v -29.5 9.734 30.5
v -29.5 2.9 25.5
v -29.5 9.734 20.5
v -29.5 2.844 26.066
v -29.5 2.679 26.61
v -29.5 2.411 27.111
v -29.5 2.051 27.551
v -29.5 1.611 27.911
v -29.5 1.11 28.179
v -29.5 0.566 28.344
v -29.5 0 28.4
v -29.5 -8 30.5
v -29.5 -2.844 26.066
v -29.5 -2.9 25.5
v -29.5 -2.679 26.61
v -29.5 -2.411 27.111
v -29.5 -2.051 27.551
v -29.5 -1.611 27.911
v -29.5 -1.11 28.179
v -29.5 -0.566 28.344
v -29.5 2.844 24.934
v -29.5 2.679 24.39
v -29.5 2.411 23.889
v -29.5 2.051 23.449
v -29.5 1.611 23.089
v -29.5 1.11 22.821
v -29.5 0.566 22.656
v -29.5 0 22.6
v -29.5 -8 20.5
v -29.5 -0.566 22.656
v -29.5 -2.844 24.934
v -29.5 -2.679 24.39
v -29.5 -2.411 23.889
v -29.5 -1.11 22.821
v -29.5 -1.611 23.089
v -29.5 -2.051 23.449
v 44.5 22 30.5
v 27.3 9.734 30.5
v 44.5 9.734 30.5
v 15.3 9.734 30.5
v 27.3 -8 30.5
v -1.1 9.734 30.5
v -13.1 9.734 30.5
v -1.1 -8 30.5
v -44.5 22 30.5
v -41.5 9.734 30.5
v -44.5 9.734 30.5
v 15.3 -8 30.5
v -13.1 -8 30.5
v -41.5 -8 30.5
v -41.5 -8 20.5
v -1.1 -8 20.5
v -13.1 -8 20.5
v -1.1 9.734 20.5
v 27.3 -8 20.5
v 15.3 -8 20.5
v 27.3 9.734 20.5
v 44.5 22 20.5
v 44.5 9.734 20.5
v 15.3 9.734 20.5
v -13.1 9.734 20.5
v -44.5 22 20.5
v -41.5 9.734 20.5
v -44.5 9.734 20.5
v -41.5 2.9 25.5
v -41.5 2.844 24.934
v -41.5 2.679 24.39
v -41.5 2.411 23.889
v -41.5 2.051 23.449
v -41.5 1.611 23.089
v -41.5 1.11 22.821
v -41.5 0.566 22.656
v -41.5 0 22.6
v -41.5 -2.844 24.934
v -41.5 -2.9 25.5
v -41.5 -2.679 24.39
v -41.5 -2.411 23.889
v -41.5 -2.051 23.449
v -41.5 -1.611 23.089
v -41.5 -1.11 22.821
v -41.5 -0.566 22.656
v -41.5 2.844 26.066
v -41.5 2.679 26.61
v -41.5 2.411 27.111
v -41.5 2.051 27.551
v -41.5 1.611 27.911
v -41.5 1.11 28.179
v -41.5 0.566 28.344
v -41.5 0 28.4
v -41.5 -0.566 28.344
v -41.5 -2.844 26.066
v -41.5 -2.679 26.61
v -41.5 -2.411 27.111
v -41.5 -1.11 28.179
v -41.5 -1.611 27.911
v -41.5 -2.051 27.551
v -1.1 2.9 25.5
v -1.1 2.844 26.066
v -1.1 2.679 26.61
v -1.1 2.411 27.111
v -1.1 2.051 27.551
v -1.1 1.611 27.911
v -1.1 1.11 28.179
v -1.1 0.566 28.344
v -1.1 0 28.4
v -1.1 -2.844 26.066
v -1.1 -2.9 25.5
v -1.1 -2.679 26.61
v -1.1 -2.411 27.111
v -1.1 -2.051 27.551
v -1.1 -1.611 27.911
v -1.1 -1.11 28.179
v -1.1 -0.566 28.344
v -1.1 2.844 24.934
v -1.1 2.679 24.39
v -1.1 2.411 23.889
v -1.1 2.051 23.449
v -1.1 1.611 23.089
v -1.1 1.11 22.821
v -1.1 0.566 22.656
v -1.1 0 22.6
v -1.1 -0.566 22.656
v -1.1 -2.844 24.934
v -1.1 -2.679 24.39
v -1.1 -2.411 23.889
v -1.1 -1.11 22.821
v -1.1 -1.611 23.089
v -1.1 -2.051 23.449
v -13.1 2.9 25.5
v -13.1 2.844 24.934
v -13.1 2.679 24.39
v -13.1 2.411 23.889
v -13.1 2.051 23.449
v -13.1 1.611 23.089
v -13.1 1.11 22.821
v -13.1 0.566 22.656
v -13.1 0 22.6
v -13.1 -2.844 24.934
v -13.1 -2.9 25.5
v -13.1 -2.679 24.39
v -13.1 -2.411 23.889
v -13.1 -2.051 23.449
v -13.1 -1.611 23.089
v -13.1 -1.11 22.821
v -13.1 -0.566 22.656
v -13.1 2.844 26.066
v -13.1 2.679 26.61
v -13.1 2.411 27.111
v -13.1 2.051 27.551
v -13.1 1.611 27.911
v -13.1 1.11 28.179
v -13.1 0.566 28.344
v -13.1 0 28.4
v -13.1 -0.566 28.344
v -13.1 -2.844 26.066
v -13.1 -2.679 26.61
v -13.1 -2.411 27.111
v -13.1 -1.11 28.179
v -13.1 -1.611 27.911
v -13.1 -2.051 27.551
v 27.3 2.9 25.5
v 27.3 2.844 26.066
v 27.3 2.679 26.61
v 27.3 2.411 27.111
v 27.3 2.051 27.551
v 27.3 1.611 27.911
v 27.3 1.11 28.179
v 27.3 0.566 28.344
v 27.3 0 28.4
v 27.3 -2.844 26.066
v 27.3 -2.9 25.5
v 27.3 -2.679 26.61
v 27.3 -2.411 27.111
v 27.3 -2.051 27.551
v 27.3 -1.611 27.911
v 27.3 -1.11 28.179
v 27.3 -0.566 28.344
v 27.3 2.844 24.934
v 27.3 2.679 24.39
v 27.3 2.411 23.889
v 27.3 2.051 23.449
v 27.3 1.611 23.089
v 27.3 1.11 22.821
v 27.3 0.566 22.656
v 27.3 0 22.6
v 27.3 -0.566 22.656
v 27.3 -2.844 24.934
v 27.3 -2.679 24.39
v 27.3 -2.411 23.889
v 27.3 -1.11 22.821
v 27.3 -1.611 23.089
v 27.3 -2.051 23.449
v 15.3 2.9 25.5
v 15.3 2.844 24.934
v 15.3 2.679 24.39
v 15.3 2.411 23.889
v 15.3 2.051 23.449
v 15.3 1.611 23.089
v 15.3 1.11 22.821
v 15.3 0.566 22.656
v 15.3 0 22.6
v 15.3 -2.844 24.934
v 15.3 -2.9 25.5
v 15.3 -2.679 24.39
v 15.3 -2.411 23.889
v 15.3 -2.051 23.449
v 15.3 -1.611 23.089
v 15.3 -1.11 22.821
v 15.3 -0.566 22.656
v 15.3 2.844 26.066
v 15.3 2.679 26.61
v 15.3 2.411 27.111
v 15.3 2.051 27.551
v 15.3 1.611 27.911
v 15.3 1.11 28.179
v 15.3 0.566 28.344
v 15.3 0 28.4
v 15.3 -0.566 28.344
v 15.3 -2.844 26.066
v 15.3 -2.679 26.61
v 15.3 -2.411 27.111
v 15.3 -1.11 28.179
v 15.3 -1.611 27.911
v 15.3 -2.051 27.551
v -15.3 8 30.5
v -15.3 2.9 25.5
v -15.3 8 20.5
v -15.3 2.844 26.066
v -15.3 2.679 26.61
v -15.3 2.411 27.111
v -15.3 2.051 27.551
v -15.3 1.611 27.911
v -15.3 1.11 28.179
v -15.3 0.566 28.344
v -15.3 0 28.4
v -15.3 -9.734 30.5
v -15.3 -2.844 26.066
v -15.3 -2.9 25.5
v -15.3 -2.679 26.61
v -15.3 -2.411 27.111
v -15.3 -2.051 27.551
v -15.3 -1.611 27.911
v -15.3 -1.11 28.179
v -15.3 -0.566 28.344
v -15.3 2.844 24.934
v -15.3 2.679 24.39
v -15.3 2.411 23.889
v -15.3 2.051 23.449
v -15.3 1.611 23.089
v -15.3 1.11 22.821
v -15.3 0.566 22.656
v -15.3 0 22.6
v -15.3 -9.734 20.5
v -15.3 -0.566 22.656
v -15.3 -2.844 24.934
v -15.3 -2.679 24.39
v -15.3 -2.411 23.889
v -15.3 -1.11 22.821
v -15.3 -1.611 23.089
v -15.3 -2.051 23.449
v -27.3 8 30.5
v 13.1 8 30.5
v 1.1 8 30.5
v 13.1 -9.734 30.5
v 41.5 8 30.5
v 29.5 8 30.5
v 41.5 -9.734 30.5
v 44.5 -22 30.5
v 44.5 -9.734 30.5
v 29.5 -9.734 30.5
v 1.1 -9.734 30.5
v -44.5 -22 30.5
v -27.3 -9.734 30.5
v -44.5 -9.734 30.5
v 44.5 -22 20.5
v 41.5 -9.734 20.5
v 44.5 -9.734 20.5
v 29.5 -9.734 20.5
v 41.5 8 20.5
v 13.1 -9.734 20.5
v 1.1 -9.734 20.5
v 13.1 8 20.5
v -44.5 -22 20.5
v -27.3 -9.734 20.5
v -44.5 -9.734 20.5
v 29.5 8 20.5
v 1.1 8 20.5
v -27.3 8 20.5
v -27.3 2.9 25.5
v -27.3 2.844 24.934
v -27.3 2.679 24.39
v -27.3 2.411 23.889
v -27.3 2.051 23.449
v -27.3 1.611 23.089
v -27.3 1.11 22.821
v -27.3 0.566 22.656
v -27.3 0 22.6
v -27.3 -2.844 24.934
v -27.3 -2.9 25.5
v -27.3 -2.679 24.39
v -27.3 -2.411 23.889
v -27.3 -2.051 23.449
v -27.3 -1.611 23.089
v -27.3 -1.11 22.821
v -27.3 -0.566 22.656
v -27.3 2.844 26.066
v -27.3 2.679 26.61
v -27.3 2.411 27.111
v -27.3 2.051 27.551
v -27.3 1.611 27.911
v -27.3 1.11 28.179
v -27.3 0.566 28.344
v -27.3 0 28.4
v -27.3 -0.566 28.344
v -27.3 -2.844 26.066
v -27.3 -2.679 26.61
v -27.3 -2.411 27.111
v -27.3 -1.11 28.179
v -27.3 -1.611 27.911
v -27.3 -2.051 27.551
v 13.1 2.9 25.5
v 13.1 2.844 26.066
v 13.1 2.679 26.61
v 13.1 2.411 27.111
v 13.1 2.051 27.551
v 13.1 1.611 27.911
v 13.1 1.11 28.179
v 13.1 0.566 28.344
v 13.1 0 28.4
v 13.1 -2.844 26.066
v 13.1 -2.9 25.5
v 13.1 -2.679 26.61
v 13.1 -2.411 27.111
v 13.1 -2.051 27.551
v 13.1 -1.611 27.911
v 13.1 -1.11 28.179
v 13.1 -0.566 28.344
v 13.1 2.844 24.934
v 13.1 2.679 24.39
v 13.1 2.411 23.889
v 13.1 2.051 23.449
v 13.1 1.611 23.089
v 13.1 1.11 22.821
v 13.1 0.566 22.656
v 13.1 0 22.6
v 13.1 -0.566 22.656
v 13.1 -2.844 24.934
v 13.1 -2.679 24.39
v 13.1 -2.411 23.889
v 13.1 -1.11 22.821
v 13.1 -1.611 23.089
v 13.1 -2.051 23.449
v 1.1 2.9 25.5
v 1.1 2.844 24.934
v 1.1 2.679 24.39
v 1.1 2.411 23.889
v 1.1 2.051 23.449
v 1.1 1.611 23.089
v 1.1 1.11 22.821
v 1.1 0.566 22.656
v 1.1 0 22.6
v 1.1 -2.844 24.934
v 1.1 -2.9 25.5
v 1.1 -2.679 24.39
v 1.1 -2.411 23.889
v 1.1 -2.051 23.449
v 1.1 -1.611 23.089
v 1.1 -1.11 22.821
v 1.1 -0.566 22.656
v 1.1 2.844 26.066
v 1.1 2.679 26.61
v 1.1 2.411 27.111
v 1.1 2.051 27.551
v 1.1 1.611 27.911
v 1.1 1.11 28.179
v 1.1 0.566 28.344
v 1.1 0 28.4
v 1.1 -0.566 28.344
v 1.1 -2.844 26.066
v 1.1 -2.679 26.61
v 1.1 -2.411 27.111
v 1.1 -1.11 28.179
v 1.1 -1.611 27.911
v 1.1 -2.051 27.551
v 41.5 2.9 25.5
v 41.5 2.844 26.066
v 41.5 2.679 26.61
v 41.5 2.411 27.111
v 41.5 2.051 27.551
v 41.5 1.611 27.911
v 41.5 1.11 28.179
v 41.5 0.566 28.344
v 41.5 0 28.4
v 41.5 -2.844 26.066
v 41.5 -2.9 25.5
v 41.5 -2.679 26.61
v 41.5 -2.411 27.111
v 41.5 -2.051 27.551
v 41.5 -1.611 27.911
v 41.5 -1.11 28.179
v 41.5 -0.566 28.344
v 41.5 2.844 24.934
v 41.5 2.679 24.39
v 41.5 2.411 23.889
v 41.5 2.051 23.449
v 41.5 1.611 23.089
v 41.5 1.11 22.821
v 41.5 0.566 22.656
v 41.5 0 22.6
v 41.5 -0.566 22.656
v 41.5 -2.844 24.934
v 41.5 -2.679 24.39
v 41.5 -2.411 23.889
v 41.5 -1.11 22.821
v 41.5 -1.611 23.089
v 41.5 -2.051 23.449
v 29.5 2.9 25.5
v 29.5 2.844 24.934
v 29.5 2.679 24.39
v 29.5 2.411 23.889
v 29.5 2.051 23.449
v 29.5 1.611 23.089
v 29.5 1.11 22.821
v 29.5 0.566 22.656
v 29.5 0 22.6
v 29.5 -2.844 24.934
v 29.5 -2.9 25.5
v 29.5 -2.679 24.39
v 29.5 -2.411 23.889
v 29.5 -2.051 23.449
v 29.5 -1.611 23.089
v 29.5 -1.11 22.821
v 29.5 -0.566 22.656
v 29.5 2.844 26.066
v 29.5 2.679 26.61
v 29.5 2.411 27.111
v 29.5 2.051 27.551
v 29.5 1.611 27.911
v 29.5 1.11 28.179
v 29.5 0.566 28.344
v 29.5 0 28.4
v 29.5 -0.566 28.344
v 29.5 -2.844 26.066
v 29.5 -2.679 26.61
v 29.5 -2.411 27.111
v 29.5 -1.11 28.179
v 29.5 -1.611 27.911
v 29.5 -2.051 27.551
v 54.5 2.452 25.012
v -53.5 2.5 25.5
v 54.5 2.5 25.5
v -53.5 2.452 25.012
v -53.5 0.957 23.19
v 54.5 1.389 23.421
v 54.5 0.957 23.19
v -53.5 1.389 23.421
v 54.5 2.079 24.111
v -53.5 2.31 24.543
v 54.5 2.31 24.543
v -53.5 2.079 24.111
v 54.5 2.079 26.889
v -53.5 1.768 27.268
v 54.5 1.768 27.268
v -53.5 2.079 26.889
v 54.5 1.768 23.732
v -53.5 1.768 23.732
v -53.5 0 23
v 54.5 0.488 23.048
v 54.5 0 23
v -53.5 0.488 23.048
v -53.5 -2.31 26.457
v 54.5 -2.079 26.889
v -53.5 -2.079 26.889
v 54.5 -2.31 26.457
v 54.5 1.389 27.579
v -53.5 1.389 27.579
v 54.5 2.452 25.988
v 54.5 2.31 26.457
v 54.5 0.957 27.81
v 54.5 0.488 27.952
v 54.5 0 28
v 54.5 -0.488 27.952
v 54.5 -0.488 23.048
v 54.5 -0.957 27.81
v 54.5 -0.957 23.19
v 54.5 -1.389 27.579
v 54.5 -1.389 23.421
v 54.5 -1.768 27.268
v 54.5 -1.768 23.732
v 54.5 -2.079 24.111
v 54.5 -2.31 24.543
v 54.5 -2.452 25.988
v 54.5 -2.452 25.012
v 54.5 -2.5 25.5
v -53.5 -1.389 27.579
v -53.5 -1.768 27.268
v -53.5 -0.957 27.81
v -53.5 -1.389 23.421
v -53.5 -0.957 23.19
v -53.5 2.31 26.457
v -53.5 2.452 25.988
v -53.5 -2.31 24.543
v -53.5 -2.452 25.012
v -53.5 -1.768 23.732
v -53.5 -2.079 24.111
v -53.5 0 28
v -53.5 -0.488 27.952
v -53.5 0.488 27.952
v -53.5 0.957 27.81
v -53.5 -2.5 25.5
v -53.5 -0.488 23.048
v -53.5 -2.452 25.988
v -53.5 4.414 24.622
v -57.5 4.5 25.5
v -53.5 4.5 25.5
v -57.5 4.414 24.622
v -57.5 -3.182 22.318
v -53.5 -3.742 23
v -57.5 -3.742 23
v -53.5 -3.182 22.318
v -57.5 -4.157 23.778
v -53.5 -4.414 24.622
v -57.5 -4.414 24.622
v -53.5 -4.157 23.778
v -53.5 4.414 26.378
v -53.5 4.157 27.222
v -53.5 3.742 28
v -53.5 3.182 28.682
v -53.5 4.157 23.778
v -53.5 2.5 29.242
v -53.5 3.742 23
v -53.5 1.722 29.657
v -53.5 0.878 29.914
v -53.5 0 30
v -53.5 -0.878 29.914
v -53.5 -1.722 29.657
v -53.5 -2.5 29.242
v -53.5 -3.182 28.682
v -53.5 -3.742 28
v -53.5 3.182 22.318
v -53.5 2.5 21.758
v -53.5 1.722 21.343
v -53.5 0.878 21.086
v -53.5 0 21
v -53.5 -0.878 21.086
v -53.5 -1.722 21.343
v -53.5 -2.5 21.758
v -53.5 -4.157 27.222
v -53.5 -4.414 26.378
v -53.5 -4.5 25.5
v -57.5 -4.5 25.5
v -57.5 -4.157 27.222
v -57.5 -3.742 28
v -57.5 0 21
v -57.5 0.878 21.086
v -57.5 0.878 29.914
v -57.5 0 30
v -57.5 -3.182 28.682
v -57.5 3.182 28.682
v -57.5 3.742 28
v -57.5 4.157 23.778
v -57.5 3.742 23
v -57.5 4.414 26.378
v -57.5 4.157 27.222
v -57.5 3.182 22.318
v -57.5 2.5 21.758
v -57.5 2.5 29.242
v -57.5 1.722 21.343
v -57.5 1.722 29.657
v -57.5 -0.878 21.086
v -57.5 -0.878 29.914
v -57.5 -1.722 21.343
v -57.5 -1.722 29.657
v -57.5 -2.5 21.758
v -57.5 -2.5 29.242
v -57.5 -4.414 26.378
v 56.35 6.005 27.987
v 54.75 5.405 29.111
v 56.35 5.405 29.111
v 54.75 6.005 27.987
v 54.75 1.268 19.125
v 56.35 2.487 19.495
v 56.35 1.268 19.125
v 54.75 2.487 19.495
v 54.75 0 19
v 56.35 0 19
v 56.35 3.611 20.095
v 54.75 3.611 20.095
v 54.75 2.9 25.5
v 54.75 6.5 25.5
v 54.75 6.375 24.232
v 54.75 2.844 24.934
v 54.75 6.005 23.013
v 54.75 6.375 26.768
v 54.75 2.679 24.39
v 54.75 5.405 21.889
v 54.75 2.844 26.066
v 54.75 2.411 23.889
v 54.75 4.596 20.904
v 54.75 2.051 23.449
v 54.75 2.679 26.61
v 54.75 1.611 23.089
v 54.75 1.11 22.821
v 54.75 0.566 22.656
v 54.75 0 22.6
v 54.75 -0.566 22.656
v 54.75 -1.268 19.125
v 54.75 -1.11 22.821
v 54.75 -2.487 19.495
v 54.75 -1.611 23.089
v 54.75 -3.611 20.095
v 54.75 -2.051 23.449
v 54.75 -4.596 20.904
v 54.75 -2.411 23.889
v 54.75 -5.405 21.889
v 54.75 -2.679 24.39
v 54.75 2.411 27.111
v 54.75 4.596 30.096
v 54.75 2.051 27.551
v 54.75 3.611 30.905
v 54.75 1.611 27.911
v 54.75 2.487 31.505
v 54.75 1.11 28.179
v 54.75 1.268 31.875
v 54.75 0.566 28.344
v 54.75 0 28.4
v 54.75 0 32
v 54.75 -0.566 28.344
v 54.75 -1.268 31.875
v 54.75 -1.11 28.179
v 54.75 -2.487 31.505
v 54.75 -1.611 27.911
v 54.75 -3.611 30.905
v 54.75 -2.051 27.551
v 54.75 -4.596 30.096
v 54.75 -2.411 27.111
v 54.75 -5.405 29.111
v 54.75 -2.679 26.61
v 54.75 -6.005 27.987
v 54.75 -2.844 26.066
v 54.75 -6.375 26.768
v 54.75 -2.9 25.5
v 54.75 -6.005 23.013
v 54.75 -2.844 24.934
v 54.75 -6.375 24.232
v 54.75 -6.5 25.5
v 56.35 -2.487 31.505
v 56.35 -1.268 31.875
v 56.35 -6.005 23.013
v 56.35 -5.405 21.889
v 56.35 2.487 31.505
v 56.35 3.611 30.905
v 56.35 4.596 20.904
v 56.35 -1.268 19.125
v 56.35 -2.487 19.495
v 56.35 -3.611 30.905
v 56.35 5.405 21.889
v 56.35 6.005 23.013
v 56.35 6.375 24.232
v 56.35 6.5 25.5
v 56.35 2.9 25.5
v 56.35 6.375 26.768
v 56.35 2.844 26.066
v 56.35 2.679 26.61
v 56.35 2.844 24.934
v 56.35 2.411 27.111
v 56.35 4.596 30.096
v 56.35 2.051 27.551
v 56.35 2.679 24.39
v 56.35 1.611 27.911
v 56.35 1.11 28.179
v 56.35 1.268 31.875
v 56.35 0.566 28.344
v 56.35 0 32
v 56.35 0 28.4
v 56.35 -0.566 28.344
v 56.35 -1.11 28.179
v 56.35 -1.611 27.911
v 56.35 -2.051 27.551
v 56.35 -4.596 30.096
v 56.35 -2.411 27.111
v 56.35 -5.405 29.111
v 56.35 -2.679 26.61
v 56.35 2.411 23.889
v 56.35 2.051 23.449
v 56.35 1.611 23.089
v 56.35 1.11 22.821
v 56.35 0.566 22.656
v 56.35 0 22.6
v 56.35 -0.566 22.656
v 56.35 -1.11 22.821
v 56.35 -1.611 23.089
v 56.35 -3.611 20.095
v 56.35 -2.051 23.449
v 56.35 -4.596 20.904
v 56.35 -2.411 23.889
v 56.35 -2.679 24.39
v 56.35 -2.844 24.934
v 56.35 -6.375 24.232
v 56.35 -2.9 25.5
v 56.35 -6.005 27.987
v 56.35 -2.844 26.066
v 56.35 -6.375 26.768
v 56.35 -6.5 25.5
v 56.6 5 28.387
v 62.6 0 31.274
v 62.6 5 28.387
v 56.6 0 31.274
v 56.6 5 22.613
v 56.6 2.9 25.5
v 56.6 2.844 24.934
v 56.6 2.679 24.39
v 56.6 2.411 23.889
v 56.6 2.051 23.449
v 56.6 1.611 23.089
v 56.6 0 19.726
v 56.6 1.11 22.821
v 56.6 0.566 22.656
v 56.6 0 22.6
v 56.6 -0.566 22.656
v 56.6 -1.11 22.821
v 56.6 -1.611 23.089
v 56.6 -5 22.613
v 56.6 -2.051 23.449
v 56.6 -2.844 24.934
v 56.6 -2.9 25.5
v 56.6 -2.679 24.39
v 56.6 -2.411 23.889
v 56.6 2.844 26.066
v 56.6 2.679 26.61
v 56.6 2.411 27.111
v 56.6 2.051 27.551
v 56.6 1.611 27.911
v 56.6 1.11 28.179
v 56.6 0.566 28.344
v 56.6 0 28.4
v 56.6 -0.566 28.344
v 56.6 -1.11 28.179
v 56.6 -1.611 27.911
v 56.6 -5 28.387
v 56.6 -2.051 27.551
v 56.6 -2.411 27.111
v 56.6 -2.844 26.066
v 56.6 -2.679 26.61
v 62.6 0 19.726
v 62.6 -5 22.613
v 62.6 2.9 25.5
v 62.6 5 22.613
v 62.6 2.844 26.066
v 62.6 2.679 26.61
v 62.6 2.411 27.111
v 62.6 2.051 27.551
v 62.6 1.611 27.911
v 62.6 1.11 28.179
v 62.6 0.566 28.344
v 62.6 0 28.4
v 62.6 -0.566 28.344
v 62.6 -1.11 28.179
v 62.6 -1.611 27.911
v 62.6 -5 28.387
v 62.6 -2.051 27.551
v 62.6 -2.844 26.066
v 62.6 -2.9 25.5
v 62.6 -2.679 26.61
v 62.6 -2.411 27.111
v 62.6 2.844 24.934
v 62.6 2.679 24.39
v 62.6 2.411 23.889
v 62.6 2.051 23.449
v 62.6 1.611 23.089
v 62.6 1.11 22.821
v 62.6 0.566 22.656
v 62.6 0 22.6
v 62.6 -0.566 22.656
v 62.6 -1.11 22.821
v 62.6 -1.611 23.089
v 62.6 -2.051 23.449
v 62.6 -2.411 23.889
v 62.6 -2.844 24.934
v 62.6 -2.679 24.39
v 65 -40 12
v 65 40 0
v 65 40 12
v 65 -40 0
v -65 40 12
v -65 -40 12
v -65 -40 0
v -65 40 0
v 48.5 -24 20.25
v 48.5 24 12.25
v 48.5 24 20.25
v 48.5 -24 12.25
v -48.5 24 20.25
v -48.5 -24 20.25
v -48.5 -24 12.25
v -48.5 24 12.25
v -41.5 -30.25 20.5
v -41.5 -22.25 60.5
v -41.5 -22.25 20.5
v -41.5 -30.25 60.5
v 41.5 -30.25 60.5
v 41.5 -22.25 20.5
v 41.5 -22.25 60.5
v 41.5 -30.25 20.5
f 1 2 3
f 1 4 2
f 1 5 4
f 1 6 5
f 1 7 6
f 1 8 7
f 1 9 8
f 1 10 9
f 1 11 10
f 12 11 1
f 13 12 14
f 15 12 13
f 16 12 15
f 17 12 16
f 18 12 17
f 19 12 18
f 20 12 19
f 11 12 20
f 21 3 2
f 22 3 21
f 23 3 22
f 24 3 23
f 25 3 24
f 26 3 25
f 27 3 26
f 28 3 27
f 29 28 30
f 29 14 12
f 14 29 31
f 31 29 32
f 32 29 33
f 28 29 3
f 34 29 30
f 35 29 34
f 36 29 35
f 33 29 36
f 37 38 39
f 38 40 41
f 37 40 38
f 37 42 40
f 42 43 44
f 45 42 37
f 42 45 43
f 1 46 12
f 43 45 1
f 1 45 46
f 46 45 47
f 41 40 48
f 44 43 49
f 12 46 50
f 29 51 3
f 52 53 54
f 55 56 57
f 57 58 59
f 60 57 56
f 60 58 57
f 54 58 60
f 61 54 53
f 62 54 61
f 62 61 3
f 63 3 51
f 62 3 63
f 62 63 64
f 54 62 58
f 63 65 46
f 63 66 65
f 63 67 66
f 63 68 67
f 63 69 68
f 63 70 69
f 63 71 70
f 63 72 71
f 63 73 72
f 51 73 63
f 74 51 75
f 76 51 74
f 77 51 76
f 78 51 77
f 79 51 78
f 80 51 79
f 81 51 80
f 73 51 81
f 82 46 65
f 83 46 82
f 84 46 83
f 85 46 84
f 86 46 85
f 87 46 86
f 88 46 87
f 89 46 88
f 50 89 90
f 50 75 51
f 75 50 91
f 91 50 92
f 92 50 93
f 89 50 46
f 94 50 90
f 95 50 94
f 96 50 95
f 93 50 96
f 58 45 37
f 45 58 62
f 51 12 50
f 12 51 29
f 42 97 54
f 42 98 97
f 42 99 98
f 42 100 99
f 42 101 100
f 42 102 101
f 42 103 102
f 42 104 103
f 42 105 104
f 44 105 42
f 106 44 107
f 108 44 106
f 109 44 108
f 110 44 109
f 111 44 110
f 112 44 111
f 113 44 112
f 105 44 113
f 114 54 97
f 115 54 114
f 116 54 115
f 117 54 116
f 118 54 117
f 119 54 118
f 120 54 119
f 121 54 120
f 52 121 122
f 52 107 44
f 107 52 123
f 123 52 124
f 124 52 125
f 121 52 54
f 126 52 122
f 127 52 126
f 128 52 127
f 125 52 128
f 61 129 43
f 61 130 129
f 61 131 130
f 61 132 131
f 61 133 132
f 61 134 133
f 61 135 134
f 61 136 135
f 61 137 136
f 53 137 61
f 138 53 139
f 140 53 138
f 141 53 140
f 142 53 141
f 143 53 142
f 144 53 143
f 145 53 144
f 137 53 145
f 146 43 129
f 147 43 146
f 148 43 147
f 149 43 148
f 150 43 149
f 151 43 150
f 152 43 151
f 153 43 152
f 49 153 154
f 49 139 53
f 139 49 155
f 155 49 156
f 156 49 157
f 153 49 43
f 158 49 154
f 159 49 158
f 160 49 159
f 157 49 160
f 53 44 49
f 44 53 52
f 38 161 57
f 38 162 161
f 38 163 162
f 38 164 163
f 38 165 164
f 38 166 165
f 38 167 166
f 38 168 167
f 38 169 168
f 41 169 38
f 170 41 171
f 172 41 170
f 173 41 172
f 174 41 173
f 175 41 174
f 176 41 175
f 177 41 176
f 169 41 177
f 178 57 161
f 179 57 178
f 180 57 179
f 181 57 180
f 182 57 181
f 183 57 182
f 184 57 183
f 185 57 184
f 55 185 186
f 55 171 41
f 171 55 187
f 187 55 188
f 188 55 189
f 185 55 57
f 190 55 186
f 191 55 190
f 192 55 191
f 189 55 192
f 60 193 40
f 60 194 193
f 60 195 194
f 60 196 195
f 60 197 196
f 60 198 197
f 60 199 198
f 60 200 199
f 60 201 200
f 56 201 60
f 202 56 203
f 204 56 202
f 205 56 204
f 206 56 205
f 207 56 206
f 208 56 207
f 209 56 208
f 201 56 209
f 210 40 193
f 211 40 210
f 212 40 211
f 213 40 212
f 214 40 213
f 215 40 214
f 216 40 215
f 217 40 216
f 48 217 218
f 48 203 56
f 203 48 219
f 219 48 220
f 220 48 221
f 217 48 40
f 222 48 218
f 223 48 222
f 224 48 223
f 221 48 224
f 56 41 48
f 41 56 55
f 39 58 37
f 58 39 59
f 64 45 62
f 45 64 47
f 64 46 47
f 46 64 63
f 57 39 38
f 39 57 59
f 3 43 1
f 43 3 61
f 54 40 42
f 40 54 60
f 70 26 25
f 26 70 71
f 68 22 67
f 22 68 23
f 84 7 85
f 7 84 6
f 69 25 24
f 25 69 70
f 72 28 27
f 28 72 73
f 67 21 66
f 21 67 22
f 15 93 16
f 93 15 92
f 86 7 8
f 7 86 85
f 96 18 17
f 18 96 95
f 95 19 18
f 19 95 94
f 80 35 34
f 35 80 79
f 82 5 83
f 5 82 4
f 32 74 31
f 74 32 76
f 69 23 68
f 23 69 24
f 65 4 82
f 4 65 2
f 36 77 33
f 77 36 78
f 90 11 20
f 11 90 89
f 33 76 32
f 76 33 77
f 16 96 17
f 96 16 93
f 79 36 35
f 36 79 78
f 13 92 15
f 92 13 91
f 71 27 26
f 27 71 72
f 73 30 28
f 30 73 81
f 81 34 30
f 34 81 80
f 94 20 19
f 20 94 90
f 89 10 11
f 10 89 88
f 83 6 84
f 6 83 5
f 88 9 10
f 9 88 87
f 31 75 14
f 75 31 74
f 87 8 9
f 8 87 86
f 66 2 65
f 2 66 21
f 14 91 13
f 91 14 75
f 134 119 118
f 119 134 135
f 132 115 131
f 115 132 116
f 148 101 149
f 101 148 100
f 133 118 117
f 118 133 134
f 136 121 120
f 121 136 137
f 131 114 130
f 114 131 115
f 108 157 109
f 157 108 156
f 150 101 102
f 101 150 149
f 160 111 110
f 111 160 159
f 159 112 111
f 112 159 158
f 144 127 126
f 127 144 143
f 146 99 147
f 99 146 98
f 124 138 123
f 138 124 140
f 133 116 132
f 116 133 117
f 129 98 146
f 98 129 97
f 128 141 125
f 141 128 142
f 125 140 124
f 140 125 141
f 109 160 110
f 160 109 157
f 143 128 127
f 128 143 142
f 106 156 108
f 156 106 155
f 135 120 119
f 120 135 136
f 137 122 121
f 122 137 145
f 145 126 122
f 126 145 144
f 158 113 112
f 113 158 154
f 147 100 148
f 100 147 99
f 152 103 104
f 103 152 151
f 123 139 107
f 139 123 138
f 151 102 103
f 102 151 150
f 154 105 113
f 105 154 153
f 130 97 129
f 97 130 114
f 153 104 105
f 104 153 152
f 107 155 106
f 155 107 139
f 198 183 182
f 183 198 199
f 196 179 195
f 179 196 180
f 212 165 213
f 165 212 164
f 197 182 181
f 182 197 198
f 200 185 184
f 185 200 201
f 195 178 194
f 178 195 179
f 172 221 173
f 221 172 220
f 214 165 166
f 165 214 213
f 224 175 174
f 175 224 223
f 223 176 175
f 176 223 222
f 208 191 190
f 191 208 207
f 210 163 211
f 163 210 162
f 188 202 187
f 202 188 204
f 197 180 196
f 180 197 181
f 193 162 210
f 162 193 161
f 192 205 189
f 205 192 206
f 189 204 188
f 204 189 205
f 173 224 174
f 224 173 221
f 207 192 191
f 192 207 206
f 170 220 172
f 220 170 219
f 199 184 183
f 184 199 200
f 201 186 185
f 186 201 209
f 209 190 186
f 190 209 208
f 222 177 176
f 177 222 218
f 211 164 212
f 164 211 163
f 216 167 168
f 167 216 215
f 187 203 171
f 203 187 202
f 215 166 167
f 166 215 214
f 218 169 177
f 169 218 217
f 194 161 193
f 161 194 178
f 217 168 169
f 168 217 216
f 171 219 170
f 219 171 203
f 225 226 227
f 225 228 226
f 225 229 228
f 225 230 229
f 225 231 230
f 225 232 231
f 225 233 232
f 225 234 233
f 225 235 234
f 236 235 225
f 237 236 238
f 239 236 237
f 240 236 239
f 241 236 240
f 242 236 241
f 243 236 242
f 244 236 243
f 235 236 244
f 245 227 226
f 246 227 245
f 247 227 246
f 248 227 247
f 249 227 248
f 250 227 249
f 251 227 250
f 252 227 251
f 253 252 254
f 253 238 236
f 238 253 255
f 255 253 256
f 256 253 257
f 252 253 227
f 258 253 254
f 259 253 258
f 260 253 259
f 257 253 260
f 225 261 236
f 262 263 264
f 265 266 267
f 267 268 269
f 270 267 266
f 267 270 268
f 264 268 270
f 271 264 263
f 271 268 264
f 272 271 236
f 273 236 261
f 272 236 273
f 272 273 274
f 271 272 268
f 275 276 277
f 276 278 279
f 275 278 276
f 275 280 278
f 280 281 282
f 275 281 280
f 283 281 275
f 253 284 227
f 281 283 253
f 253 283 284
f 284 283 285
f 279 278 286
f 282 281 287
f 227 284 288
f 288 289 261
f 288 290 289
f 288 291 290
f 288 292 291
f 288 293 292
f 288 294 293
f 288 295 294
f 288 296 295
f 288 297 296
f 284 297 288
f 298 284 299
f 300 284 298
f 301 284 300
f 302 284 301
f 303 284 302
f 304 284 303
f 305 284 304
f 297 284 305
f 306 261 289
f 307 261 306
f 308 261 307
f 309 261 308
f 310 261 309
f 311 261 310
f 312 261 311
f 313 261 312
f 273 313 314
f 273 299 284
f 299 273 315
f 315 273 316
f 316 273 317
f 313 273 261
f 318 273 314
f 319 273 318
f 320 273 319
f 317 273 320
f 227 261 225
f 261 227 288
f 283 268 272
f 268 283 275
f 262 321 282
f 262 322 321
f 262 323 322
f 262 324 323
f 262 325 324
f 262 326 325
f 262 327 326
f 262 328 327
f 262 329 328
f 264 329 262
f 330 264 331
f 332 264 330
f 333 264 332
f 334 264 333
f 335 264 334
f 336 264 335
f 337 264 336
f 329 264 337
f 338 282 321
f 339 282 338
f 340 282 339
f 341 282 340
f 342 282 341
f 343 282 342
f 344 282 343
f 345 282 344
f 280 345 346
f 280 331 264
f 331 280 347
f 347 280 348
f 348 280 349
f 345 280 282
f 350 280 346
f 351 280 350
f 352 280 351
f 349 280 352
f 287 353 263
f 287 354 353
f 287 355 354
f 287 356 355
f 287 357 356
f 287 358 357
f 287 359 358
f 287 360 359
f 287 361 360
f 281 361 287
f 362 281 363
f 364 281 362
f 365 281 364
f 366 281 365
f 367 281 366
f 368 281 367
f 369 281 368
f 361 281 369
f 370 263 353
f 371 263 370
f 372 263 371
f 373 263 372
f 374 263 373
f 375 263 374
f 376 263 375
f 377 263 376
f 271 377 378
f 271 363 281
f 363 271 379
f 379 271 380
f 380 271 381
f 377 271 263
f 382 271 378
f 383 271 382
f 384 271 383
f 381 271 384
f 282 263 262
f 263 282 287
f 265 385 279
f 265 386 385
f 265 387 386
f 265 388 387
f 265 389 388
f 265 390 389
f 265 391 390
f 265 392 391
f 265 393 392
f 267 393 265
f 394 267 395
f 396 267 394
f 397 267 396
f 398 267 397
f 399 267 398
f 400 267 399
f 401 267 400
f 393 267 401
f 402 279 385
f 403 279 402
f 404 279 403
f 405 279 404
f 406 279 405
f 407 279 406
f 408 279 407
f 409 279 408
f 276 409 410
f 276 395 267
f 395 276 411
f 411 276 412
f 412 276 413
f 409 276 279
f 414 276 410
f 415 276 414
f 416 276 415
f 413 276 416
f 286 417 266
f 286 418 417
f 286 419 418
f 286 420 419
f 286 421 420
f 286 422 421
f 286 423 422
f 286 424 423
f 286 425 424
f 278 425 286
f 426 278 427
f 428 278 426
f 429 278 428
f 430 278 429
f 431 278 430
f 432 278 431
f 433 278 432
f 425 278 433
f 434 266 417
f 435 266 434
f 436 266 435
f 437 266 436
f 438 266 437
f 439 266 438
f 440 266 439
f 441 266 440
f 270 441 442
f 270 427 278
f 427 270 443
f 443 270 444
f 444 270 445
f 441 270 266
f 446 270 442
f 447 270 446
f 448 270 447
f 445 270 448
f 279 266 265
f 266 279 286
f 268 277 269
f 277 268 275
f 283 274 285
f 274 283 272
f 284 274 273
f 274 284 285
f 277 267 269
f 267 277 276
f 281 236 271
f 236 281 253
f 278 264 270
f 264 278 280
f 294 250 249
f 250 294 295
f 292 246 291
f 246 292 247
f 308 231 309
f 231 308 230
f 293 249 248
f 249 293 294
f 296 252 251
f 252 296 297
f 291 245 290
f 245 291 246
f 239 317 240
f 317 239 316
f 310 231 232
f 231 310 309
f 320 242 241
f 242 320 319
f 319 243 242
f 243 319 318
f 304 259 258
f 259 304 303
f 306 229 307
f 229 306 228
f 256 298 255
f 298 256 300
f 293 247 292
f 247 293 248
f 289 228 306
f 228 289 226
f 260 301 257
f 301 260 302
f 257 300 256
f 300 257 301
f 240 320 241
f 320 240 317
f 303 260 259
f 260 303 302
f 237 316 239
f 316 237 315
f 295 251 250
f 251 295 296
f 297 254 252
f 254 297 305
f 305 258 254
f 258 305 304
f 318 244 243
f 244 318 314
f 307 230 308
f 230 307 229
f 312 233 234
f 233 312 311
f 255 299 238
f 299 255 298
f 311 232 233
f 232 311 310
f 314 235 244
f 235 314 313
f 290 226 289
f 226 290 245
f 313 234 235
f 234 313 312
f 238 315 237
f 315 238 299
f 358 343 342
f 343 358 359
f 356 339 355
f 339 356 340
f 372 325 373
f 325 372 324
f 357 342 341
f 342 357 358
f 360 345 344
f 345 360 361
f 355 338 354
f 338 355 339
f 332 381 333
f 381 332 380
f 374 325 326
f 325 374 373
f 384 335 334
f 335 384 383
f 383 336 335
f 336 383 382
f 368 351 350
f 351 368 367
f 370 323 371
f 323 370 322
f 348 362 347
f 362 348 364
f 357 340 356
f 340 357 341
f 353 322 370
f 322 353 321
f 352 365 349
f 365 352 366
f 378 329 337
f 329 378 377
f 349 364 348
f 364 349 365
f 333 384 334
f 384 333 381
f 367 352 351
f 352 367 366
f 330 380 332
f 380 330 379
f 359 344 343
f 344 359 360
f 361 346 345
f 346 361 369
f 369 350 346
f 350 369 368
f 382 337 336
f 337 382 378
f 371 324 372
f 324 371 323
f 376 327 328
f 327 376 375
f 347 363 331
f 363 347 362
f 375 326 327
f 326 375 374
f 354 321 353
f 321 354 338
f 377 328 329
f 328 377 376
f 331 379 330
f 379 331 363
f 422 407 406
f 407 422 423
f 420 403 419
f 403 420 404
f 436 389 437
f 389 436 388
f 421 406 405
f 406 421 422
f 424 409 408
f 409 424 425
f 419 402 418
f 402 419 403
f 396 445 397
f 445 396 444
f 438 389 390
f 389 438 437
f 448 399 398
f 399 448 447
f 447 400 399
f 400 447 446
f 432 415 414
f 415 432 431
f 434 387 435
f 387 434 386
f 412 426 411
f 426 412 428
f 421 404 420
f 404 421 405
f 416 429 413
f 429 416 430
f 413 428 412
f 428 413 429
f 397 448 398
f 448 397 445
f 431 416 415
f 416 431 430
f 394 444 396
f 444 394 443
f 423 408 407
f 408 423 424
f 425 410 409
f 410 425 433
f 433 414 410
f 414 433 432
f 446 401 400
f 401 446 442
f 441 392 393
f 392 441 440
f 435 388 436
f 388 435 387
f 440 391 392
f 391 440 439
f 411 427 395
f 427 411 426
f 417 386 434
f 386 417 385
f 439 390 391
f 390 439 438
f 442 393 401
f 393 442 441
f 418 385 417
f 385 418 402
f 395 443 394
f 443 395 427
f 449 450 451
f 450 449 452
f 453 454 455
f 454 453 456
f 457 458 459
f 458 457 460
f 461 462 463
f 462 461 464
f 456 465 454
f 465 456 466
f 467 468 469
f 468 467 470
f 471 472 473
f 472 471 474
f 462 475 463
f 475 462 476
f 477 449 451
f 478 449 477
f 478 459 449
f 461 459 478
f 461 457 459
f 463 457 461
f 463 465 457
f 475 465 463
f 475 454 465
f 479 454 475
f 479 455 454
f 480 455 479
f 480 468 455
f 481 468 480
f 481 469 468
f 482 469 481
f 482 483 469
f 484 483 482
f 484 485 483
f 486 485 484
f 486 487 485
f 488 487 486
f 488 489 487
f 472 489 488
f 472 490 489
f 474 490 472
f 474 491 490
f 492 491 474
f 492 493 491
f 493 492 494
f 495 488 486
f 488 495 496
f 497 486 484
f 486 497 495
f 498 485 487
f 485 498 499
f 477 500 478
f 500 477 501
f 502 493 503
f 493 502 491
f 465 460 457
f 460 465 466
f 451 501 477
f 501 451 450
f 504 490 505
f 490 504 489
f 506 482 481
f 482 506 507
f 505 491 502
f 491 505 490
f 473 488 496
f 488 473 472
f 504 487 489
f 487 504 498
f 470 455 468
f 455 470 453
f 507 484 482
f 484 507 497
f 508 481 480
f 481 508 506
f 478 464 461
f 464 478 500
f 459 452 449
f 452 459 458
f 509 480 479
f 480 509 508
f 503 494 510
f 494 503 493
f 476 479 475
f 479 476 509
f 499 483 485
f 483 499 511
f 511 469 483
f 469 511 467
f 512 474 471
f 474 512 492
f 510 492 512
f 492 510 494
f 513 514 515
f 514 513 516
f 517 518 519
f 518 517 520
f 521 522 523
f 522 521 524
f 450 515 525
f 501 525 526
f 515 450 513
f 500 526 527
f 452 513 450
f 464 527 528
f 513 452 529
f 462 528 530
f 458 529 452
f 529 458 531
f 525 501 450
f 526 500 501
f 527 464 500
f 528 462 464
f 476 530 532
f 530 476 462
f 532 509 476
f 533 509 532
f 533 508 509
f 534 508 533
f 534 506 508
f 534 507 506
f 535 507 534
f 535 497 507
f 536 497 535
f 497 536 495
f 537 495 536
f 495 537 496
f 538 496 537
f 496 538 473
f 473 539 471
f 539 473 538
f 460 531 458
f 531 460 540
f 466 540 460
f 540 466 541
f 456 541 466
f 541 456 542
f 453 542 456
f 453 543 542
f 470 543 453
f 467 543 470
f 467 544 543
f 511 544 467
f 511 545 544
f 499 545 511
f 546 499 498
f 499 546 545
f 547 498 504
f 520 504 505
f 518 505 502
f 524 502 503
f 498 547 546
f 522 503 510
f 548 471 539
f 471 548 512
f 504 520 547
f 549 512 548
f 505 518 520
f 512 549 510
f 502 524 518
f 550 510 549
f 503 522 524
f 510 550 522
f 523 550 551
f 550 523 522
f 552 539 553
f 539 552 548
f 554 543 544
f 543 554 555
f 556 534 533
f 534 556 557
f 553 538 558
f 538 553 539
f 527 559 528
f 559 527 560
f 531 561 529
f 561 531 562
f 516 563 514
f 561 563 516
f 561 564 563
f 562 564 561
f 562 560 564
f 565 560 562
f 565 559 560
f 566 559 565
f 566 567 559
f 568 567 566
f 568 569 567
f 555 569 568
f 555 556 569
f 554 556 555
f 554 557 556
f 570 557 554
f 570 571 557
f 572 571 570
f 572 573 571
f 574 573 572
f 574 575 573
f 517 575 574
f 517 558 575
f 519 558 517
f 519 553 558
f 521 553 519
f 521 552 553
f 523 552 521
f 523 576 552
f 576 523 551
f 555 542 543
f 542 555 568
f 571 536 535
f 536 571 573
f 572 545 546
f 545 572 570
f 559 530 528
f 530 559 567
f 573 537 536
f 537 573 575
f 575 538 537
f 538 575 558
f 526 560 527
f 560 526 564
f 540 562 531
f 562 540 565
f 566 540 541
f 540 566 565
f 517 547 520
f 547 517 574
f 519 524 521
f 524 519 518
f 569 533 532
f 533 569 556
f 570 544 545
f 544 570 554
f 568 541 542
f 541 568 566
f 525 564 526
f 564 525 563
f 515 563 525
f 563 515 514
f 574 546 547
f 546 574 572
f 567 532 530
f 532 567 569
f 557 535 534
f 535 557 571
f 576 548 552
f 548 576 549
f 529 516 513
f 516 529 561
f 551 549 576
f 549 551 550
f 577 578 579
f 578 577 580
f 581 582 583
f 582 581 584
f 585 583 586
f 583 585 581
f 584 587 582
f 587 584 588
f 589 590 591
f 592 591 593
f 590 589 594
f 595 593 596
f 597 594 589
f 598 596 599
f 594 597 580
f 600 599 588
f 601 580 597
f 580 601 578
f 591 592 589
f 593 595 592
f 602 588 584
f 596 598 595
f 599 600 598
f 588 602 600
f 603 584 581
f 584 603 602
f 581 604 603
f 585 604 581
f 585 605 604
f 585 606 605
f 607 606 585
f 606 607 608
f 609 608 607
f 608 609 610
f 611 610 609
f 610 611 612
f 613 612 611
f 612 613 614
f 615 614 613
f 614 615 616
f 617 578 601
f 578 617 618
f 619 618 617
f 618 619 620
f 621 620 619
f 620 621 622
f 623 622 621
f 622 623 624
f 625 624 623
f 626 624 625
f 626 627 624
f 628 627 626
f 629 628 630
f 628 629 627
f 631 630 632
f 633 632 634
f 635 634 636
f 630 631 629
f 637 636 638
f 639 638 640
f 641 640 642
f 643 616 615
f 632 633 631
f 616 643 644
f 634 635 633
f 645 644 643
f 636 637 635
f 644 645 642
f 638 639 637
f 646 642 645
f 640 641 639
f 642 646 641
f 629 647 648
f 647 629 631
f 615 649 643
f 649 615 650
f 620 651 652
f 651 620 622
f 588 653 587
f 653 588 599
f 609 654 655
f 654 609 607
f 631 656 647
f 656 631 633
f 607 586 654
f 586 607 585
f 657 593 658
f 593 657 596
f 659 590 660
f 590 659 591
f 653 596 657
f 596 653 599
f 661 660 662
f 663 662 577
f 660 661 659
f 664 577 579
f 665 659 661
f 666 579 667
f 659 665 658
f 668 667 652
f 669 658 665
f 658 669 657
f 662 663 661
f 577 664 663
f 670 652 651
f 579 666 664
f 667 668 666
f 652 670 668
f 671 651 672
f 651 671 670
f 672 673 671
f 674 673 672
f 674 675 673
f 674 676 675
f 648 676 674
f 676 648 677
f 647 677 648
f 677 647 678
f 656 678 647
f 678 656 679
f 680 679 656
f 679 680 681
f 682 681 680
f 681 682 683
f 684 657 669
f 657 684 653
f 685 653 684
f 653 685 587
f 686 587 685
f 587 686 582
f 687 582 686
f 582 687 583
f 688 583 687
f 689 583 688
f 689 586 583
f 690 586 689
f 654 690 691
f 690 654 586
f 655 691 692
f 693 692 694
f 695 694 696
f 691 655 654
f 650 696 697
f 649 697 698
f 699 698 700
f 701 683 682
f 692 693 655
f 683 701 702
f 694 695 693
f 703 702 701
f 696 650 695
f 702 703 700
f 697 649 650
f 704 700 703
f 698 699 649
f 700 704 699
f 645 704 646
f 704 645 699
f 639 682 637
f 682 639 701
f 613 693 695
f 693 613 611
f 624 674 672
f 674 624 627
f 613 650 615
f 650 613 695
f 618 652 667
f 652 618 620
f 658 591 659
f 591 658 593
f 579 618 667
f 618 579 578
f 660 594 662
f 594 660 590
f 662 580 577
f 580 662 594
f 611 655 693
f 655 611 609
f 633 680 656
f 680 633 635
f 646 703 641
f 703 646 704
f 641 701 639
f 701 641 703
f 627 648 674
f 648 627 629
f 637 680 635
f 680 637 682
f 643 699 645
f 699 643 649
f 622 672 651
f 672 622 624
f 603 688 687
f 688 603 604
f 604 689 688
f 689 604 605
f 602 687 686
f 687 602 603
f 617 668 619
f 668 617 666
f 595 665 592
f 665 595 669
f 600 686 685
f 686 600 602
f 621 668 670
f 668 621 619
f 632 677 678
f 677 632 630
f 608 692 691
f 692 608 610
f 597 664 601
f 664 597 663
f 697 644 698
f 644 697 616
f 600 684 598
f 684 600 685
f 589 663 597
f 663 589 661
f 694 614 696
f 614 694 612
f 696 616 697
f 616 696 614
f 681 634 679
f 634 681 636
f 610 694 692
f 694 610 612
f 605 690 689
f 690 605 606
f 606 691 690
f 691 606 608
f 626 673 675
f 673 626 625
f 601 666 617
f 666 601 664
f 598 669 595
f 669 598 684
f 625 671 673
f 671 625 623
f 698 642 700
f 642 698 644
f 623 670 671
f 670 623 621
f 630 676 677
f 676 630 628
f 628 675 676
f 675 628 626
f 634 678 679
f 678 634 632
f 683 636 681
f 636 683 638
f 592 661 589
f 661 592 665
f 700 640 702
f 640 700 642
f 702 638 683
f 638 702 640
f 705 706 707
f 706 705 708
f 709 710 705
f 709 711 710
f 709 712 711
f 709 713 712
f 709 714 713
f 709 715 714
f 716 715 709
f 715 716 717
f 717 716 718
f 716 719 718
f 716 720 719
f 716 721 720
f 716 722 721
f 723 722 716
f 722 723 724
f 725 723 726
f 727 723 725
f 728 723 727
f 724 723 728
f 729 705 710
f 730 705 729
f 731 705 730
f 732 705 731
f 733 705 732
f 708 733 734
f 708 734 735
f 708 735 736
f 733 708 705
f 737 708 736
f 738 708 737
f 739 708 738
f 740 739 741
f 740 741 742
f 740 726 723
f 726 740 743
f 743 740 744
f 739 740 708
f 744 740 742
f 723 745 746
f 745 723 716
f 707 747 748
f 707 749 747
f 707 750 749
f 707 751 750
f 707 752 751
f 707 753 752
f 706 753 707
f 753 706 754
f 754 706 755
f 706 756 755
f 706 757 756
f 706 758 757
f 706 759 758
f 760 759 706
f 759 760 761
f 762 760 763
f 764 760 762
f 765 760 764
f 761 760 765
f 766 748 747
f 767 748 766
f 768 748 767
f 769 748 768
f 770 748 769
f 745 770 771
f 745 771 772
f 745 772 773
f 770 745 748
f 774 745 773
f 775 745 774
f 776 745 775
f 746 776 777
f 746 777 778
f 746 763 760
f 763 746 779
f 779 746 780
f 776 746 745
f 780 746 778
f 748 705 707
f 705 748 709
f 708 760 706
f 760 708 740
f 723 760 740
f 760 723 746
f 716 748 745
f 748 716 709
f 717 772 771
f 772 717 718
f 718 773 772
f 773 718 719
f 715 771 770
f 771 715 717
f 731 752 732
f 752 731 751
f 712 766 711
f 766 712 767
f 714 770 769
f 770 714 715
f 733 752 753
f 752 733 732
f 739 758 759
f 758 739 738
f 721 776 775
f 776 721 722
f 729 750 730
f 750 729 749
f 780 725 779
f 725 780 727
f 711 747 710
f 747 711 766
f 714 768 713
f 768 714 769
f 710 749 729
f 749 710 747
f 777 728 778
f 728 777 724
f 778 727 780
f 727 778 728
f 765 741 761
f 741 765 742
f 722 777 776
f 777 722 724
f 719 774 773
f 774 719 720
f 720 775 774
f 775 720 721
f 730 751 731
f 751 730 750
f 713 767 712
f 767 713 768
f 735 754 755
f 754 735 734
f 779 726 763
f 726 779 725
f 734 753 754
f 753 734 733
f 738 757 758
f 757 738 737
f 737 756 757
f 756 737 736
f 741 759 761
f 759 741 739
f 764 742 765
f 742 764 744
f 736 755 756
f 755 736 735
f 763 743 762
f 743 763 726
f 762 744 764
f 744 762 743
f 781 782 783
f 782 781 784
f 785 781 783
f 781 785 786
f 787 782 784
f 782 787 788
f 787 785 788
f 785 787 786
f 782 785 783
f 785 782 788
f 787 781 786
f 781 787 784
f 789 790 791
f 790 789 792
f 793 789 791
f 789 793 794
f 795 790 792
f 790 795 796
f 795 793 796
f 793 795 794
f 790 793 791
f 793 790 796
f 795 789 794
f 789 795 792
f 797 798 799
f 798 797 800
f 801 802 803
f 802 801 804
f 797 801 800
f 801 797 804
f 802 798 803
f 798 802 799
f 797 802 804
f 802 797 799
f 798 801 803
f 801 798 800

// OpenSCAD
$fn = 32;

// ------------------------------------------------------------------------
// Comb hinge with flap: leaf 89 x 22 mm, pin d5, flap 40 mm
// Every part is its own module, assembly() places every instance.
// ------------------------------------------------------------------------

// --- part 1 ---
module hinge_bed() {
  difference() {
    translate([-65, -40, 0]) cube([130, 80, 12]);
  }
}

// --- part 2 ---
module hinge_riser() {
  difference() {
    translate([-48.5, -24, 0]) cube([97, 48, 8]);
  }
}

// --- part 3 ---
module hinge_leaf_a() {
  difference() {
    union() {
      translate([-41.5, -8, -5]) cube([12, 30, 10]);
      translate([-13.1, -8, -5]) cube([12, 30, 10]);
      translate([15.3, -8, -5]) cube([12, 30, 10]);
      translate([-44.5, 9.734, -5]) cube([89, 12.266, 10]);
    }
    translate([-35.5, 0, 0]) rotate([0, 90, 0]) cylinder(h = 14, d = 5.8, center = true);
    translate([-7.1, 0, 0]) rotate([0, 90, 0]) cylinder(h = 14, d = 5.8, center = true);
    translate([21.3, 0, 0]) rotate([0, 90, 0]) cylinder(h = 14, d = 5.8, center = true);
  }
}

// --- part 4 ---
module hinge_leaf_b() {
  difference() {
    union() {
      translate([-27.3, -22, -5]) cube([12, 30, 10]);
      translate([1.1, -22, -5]) cube([12, 30, 10]);
      translate([29.5, -22, -5]) cube([12, 30, 10]);
      translate([-44.5, -22, -5]) cube([89, 12.266, 10]);
    }
    translate([-21.3, 0, 0]) rotate([0, 90, 0]) cylinder(h = 14, d = 5.8, center = true);
    translate([7.1, 0, 0]) rotate([0, 90, 0]) cylinder(h = 14, d = 5.8, center = true);
    translate([35.5, 0, 0]) rotate([0, 90, 0]) cylinder(h = 14, d = 5.8, center = true);
  }
}

// --- part 5 ---
module hinge_flap() {
  difference() {
    translate([-41.5, -20, 0]) cube([83, 40, 8]);
  }
}

// --- part 6 ---
module hinge_pin() {
  rotate([0, 90, 0]) cylinder(h = 109, d = 5, center = true);
  translate([-57.5, 0, 0]) rotate([0, 90, 0]) cylinder(h = 4, d = 9);
}

// --- part 7 ---
module pin_washer() {
  difference() {
      translate([0, 0, 0]) cylinder(h = 1.6, d = 13);
      translate([0, 0, -1]) cylinder(h = 3.6, d = 5.8);
    }
}

// --- part 8 ---
module pin_nut() {
  difference() {
    linear_extrude(height = 6) polygon(points = [[5.774, 0], [2.887, 5], [-2.887, 5], [-5.774, 0], [-2.887, -5], [2.887, -5]]);
    translate([0, 0, -1]) cylinder(h = 8, d = 5.8);
  }
}

// --- assembly ---
module assembly() {
  color([0.80, 0.24, 0.20]) translate([0, 0, 0]) rotate([0, 0, 0]) hinge_bed();
  color([0.20, 0.45, 0.75]) translate([0, 0, 12.25]) rotate([0, 0, 0]) hinge_riser();
  color([0.25, 0.62, 0.32]) translate([0, 0, 25.5]) rotate([0, 0, 0]) hinge_leaf_a();
  color([0.92, 0.70, 0.18]) translate([0, 0, 25.5]) rotate([0, 0, 0]) hinge_leaf_b();
  color([0.58, 0.35, 0.70]) translate([0, -22.25, 40.5]) rotate([90, 0, 0]) hinge_flap();
  color([0.16, 0.66, 0.66]) translate([0, 0, 25.5]) rotate([0, 0, 0]) hinge_pin();
  color([0.85, 0.48, 0.18]) translate([54.75, 0, 25.5]) rotate([0, 90, 0]) pin_washer();
  color([0.55, 0.60, 0.65]) translate([56.6, 0, 25.5]) rotate([0, 90, 0]) pin_nut();
}

assembly();
